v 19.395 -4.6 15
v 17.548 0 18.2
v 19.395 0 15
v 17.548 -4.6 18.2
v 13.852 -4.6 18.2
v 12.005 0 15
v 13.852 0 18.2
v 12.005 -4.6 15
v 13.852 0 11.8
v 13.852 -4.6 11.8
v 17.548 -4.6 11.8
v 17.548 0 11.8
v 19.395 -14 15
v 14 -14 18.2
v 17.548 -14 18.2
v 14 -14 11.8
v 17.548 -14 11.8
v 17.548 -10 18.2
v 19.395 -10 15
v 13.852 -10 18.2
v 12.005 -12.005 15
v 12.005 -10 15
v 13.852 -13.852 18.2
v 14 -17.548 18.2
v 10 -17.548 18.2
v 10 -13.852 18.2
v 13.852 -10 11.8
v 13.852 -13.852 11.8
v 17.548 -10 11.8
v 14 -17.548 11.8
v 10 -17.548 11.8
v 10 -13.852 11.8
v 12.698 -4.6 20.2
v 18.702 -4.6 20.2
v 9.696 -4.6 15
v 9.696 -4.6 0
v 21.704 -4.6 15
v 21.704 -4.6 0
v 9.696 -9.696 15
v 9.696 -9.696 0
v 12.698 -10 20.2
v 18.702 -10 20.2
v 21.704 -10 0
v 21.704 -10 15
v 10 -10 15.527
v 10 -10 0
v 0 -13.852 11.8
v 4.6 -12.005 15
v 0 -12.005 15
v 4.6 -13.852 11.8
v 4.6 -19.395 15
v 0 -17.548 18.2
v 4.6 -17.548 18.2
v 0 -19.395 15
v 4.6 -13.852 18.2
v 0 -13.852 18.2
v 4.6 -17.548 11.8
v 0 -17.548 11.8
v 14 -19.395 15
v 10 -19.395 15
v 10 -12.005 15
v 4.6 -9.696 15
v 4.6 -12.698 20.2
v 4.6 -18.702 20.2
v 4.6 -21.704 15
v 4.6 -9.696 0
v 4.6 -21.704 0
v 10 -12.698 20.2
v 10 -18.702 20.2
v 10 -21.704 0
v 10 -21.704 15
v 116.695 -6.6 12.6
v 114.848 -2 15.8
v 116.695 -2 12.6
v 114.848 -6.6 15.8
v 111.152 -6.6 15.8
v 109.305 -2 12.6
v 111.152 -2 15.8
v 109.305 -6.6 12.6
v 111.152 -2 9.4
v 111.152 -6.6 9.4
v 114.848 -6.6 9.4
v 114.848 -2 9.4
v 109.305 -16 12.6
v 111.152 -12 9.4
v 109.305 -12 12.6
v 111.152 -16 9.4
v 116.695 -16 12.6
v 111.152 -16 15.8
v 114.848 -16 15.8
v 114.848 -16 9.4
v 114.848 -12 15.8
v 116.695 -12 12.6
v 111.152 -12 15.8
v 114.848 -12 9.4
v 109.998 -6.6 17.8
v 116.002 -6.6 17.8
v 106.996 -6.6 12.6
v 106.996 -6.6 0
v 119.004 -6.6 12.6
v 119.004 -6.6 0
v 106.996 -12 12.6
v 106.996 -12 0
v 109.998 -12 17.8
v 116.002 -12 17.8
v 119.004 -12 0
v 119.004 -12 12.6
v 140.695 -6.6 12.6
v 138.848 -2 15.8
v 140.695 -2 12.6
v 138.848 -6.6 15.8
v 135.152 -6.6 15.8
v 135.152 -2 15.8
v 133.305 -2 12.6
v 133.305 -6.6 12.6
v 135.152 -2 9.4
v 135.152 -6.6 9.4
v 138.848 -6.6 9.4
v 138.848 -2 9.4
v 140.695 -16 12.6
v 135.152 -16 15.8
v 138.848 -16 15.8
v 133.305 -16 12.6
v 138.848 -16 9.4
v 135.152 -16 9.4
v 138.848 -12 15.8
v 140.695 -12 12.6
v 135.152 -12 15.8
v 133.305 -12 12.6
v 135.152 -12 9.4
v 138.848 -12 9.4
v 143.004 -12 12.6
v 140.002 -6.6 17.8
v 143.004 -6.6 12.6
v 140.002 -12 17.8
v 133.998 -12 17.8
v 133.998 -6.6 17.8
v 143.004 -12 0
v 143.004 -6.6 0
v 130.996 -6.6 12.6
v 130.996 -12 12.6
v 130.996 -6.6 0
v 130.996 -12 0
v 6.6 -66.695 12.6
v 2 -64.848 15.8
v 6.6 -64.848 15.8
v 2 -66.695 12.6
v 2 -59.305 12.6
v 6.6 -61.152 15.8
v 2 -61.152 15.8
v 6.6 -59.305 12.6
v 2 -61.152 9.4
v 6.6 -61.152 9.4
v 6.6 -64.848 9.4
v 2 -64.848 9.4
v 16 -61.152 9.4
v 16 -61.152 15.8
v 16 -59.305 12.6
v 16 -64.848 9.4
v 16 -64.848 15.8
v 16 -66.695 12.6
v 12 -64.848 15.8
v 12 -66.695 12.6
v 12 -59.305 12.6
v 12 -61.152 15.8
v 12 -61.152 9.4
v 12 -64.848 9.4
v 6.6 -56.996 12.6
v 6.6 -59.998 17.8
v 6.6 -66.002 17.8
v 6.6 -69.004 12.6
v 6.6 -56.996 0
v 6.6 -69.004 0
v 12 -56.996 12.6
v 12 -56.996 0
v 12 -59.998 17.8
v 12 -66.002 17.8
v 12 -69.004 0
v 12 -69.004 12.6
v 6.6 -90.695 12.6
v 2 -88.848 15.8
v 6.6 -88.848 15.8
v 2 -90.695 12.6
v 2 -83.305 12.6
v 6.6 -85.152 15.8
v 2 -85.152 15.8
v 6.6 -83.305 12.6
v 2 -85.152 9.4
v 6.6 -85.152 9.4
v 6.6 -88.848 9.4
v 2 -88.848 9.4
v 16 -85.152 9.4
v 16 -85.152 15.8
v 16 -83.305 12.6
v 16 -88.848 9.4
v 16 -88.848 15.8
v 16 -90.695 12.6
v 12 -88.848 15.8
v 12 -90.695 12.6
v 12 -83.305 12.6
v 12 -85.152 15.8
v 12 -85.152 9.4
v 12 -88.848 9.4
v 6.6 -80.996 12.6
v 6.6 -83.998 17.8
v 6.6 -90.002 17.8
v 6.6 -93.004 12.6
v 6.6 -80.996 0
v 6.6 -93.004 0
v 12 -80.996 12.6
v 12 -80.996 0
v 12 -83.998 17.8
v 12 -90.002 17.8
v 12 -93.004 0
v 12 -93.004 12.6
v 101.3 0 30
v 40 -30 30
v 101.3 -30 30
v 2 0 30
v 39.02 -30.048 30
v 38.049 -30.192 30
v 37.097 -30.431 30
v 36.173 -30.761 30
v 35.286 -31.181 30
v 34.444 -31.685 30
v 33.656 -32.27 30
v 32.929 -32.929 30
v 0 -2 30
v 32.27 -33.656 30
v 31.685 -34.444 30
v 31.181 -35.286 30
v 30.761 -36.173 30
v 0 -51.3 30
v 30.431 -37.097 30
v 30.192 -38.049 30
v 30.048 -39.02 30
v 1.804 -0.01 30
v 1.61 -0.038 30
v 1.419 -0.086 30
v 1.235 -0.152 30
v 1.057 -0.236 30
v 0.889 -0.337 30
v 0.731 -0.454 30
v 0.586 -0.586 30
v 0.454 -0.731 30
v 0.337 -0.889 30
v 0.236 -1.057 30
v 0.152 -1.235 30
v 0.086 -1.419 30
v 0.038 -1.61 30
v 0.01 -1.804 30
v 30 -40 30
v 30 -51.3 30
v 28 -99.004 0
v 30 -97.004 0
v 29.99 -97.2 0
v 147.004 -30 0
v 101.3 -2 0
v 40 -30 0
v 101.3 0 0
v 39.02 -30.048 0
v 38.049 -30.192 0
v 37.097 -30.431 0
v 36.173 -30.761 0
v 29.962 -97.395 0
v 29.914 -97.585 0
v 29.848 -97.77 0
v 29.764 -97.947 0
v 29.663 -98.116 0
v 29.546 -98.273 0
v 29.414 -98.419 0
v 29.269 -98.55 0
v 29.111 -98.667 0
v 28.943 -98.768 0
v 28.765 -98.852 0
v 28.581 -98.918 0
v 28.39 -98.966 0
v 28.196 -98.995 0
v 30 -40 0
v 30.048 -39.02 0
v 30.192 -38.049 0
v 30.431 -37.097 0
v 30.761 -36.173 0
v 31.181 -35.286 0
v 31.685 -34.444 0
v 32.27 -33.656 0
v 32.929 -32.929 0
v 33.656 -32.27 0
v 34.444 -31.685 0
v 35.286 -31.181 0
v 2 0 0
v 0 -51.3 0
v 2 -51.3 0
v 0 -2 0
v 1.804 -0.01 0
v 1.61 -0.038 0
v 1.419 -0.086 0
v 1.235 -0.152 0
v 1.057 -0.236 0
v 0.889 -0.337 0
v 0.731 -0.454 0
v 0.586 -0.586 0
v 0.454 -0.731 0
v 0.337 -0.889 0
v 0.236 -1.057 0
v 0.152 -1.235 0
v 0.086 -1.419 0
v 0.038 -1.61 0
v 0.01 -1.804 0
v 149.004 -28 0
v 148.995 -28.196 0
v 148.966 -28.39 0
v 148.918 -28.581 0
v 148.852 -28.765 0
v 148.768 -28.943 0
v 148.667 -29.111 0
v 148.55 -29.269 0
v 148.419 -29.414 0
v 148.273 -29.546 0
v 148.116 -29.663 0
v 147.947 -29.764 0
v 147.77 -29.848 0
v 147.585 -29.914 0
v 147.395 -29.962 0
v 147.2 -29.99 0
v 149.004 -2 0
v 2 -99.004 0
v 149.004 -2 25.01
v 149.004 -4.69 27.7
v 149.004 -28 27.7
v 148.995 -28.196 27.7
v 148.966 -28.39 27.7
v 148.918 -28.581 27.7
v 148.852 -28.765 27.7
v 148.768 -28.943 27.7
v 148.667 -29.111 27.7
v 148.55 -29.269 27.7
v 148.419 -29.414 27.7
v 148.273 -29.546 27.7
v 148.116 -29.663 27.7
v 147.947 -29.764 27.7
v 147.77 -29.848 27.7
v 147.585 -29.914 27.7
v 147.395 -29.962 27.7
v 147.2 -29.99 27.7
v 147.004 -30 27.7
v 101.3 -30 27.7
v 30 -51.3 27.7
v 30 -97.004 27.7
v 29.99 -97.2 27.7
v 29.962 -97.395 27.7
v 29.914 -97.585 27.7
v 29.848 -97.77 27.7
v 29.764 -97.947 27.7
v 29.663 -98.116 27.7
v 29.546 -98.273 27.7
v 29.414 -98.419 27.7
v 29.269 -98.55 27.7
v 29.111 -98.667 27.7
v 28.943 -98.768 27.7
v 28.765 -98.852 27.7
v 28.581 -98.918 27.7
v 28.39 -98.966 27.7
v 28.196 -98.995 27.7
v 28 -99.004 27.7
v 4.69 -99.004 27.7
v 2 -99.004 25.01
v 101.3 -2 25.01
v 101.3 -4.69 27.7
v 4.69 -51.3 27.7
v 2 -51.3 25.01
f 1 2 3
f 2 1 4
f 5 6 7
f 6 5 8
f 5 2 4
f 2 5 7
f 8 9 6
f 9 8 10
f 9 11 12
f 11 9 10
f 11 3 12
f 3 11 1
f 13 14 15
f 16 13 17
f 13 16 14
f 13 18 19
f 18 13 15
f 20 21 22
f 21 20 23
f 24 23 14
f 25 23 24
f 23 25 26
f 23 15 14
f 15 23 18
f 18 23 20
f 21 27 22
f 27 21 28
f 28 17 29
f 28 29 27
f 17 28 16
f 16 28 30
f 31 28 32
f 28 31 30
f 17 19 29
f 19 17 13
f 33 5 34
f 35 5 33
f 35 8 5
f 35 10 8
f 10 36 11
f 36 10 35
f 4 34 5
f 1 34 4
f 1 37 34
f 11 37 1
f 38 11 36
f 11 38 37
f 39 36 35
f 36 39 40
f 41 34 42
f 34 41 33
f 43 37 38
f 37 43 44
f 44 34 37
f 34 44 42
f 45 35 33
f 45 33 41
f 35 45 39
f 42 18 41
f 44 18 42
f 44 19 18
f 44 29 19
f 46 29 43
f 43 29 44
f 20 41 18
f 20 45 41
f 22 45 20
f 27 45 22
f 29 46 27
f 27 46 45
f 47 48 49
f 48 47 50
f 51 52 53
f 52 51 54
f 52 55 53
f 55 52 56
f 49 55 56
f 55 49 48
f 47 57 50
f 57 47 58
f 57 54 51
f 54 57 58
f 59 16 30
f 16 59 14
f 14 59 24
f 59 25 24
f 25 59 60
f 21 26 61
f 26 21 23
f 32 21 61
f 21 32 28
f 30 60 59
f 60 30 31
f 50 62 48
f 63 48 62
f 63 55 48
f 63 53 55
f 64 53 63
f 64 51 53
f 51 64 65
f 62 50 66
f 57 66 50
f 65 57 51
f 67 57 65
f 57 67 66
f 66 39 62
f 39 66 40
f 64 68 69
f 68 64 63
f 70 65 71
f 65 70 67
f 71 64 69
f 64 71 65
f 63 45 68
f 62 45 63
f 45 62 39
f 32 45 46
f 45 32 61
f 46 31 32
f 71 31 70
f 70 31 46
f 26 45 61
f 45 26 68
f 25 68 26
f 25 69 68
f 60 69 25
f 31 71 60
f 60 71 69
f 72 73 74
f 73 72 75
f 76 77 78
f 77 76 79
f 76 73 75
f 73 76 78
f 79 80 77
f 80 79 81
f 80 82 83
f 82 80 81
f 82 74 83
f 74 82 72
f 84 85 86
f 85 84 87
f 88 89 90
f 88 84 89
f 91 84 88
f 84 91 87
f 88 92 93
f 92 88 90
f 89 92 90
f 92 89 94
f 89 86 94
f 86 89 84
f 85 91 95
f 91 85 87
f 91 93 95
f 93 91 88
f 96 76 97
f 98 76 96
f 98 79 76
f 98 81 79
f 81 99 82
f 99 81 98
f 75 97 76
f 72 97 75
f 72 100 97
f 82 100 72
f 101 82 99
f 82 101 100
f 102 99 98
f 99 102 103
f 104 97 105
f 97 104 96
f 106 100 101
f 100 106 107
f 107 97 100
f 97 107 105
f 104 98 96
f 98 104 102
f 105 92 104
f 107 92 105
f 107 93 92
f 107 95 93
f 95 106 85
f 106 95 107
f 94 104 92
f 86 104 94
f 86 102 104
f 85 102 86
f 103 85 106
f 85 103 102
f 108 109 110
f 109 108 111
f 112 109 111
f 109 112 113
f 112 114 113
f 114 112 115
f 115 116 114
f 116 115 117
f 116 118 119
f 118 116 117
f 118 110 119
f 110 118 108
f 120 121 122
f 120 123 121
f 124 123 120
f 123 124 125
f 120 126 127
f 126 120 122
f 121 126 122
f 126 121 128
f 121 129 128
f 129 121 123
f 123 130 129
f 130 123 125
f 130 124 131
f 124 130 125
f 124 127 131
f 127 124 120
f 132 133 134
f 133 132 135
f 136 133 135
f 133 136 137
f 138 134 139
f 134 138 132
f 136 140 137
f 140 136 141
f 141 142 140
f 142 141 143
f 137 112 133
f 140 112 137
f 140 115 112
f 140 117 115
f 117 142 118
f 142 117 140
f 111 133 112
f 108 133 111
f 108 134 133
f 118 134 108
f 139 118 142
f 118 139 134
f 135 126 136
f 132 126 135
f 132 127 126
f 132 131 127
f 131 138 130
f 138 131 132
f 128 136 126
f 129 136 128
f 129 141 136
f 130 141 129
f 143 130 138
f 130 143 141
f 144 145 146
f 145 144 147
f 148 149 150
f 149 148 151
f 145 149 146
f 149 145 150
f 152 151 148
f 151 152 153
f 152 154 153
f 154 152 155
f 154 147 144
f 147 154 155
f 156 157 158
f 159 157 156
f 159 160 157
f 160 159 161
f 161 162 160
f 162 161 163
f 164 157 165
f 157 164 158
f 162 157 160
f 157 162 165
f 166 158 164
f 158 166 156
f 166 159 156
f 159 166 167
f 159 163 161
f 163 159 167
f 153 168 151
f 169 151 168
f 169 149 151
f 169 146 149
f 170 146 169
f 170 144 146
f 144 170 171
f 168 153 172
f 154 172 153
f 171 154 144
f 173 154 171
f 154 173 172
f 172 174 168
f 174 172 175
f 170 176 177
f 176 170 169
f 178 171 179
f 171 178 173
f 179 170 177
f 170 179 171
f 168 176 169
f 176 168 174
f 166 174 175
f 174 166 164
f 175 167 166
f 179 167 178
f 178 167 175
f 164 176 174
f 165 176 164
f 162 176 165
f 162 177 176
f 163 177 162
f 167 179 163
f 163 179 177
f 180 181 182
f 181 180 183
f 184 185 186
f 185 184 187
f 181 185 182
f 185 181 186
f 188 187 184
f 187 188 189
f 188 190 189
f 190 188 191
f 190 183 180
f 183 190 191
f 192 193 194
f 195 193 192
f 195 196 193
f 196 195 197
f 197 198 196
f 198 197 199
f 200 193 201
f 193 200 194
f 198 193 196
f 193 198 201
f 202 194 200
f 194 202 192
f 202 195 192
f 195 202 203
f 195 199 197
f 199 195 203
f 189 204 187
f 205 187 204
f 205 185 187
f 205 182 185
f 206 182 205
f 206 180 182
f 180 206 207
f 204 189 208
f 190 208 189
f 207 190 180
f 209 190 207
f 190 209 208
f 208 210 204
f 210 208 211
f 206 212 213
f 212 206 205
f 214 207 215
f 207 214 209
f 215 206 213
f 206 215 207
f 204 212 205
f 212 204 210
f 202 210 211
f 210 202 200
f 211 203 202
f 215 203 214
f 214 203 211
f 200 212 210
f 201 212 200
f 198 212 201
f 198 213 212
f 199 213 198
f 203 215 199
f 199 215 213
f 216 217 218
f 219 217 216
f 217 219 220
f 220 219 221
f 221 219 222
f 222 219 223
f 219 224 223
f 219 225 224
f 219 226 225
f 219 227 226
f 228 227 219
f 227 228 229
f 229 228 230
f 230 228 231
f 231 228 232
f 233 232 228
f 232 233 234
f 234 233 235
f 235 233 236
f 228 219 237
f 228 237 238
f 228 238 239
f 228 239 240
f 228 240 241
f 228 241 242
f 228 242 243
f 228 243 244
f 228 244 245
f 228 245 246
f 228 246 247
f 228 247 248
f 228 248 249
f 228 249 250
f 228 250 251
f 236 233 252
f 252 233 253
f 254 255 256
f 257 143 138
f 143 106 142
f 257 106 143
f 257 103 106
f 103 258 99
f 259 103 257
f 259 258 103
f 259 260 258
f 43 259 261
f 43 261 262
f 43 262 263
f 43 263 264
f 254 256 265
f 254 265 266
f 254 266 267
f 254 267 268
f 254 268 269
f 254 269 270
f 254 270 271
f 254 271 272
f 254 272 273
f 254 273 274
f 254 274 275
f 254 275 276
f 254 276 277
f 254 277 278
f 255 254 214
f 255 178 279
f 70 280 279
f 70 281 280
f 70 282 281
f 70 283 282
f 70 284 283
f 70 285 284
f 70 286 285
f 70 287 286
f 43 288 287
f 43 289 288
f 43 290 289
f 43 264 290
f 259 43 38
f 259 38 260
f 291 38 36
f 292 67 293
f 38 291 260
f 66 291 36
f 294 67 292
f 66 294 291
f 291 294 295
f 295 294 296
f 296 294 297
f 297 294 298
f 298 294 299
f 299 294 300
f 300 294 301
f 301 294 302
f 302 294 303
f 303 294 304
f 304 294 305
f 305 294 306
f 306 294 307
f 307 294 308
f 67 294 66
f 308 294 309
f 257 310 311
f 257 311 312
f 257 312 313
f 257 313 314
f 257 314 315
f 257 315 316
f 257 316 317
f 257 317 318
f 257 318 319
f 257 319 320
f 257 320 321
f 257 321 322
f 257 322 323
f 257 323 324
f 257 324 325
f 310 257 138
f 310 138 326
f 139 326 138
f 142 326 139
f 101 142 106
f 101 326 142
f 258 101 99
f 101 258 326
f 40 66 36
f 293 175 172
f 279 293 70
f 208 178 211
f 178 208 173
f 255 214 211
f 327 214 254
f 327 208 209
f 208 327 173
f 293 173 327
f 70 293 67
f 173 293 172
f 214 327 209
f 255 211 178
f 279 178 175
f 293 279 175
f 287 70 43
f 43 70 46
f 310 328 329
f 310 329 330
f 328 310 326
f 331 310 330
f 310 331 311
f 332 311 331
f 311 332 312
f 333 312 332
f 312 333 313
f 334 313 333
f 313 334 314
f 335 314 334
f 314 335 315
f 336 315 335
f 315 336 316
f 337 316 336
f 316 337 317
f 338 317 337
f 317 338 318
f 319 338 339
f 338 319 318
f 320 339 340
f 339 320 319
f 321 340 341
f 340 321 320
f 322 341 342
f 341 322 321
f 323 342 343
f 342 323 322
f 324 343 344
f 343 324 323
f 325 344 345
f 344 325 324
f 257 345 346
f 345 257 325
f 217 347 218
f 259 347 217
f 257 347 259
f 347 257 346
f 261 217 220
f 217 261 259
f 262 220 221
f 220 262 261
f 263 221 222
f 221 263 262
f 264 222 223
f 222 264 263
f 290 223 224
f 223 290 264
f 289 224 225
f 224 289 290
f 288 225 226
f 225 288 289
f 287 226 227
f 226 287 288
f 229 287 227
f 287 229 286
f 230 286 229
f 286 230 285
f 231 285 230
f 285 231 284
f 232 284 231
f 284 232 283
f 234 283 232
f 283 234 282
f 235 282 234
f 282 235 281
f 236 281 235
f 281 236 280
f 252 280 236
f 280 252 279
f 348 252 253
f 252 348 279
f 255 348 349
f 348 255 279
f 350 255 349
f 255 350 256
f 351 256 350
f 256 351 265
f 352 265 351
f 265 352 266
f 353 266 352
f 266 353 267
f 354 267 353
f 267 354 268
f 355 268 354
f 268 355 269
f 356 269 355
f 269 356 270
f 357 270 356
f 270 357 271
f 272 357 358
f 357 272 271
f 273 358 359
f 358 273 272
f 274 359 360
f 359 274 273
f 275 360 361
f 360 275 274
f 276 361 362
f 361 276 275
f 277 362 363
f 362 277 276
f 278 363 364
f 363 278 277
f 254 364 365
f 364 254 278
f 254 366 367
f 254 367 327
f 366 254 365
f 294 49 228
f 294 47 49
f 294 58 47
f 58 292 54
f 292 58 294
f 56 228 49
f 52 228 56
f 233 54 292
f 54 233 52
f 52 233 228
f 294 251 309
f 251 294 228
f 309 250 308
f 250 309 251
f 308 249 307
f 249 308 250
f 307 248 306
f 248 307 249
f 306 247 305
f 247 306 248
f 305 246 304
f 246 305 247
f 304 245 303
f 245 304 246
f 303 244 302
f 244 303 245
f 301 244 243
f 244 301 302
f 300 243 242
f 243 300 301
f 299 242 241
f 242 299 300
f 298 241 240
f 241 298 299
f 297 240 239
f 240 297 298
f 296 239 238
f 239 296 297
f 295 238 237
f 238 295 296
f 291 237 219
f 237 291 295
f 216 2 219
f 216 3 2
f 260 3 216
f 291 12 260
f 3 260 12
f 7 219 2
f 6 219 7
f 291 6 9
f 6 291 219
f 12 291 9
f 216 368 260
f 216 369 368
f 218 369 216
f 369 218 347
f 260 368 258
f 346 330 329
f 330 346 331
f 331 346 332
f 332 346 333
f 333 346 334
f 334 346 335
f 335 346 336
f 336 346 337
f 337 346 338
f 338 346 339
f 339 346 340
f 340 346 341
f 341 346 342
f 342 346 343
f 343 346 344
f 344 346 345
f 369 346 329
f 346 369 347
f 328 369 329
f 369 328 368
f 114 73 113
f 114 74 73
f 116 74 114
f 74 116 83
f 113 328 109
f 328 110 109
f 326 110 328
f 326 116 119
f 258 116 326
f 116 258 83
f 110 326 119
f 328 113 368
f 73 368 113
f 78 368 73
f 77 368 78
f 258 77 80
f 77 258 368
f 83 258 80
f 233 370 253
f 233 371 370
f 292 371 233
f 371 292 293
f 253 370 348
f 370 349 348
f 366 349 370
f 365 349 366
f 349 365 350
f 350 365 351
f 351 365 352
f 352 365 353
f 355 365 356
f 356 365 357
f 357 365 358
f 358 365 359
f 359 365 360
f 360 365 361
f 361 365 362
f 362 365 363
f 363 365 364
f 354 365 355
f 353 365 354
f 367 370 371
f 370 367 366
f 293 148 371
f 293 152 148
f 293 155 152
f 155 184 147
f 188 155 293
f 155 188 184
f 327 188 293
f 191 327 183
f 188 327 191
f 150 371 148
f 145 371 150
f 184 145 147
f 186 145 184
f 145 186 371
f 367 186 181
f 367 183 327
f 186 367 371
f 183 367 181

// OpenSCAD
// file: ../../../../modules/steel_rack.scad
use <bolts.scad>;

bolt_edge_offset = 15;
bolt_positions = [
  bolt_edge_offset,
  bolt_edge_offset + 98,
  bolt_edge_offset + 98 + 24,
];

module bolt_and_nut(y, h) {
  nut_thickness = 5;
  translate([0, y, h / 2])
    m6_bolt_hole(h + 1, center = true);
  translate([0, y, h - nut_thickness / 2])
    rotate([0, 0, 90])
    m6_nut_trap(nut_thickness, center = true);
}

module long_bar(w, y, h) {
  difference() {
    translate([w / 2, y / 2, h / 2])
      cube([w, y, h], center = true);

    for (x = bolt_positions) {
      translate([x, 0, 0])
        bolt_and_nut(y / 2, h);
    }
  }
}

module short_bar(w, y, h) {
  difference() {
    translate([w / 2, y / 2, h / 2])
      cube([w, y, h], center = true);

    translate([bolt_positions[0], 0, 0])
      bolt_and_nut(y / 2, h);
  }
}

module fillet_profile(r, h) {
  linear_extrude(height = h, center = true)
    difference() {
      square([r, r]);
      circle(r = r, $fn = 64);
    }
}
// file: ../../../../modules/slide_rail_outer_bracket.scad
use <bolts.scad>
use <steel_rack.scad>

// スライドレール外側とL字アングルを接合するL字ブラケット。
// 設計の経緯と確定値は ledger/designs/steel-rack-500x400.md が正本。
//
// 座標系 (部品自身の datum):
//   X = 0 がこの部品側のL字アングル外側面。部品はアングル板厚の内側から始まる
//   Y = 0 がスライドレール外側面。+Y がラック外側
//   Z = 0 が部品底面 (レール下端と一致)
// front は screw_x = [37, 101.5]、rear は [79.5, 176] を自分の datum
// から渡す。 M6 が高さ 22.5±12 の対称配置のため部品は Z 反転対称になり、
// 左右のレールにも上下反転するだけで同じ2部品を使い回せる。

bracket_height = 45;
flange_t = 10; // 短辺 (X方向厚) の厚さ
// 長辺 (Y方向厚) の厚さ。旧断面は flange_t=10 を共用していたが、レール面を
// rail_offset 分外へ出すと M6 ナット挿入口が長辺と重なるため 2mm 削った
// (10→8、user決定)。ナット六角の内縁 (y=8.000) と長辺外面がツライチになる
arm_t = 8;
// レール接触面のラック外側オフセット。組付け実測でレール間隔が 385mm しか
// なくケース 412mm が入らないため、(412 - 385) / 2 + 0.5 = 14mm ずつ
// 各レールを外側へ移す (user指示)。M6 実穴は既に開いており位置を変えられない
rail_offset = 14;
inner_r = 4;
m6_z = [ 10.5, 34.5 ];
// クリアランス基準: 呼び寸法 + 0.4mm (実プリントの嵌合結果から拡大)
m6_pass_flat = 6.4; // M6ボルト通し六角の二面幅 (手前5mm)
m6_nut_flat = 10.4; // M6ナット窪み六角の二面幅 (奥5mm、ナット実測9.8 + 実効0.6)
m6_stage_depth = 5;
screw_z = 22.5;
m4_pass_flat = 4.4; // M4小トラスネジ通し六角の二面幅
m4_nut_flat = 7.4; // M4ナット窪み六角の二面幅 (ナット実測6.8 + 実効0.6)
m4_nut_depth = 2.8; // M4ナット窪みの深さ (user指定)
edge_margin = 8; // 穴の外縁から部品端までの余白 (自由な辺のみ)
angle_t = 2.2; // L字アングルの板厚

// 六角プリズム: 軸X・上下の辺が水平 (flat-up)。
// 天井を短い水平ブリッジにして垂れの改善を狙う
// (point-up だと天井面が水平から30°になり垂れた — 嵌合試験で確認済み)
module
hex_x_flat_up(flat_d, l)
{
    rotate([ 0, 90, 0 ]) rotate([ 0, 0, 90 ]) hex_hole(flat_d = flat_d, h = l);
}

// 六角プリズム: 軸Y・上下の辺が水平 (flat-up)。M6と同じくブリッジ天井
module
hex_y_flat_up(flat_d, l)
{
    rotate([ 90, 0, 0 ]) hex_hole(flat_d = flat_d, h = l);
}

module
slide_rail_outer_bracket(screw_x, name = "bracket")
{
    // flat-up配置では水平方向の穴半径は対角/2 (= 二面幅/(2*cos30))。
    // 8mm余白の契約はこの実半径に対して守る
    m6_nut_diag = m6_nut_flat / cos(30);
    m4_nut_diag = m4_nut_flat / cos(30);
    // M6中心: 実物のアングルには旧断面 (長辺厚10) の導出値
    // (厚10 + 内側R + 余白 + M6六角対角/2 = 28.0044) で既に穴が開いている。
    // 旧導出式から rail_offset を引くことで M6 実穴と部品外端の絶対位置を
    // 保ったまま、レール接触面 (y=0) だけをラック外側へ 14mm 出す
    m6_y = flange_t + inner_r + edge_margin + m6_nut_diag / 2 - rail_offset;
    short_len = m6_y + m6_nut_diag / 2 + edge_margin;
    // 長辺のX終端: 最奥のM4穴の最大断面 (ナット窪みの対角の半分) + 余白
    arm_end = max(screw_x) + m4_nut_diag / 2 + edge_margin;

    echo(str("CONTRACT ", name, ": height = ", bracket_height));
    echo(str("CONTRACT ", name, ": flange_t = ", flange_t));
    echo(str("CONTRACT ", name, ": arm_t = ", arm_t));
    echo(str("CONTRACT ", name, ": rail_offset = ", rail_offset));
    echo(str("CONTRACT ", name, ": inner_r = ", inner_r));
    echo(str("CONTRACT ", name, ": m6_z = ", m6_z));
    echo(str("CONTRACT ", name, ": m6_pass_flat = ", m6_pass_flat));
    echo(str("CONTRACT ", name, ": m6_nut_flat = ", m6_nut_flat));
    echo(str("CONTRACT ", name, ": screw_z = ", screw_z));
    echo(str("CONTRACT ", name, ": m4_pass_flat = ", m4_pass_flat));
    echo(str("CONTRACT ", name, ": m4_nut_flat = ", m4_nut_flat));
    echo(str("CONTRACT ", name, ": m4_nut_depth = ", m4_nut_depth));
    echo(str("CONTRACT ", name, ": edge_margin = ", edge_margin));
    echo(str("CONTRACT ", name, ": angle_t = ", angle_t));
    echo(str("CONTRACT ", name, ": screw_x = ", screw_x));
    echo(str("CONTRACT ",
             name,
             ": m6_y = ",
             m6_y,
             ", short_len = ",
             short_len,
             ", arm_end = ",
             arm_end));

    // 余白の契約 (自由な辺のみ。高さ45とM6のZはuser固定値なので対象外)。
    // M6ナット六角の内縁 (m6_y - 対角/2 = 8.000) は長辺外面 (y = arm_t) と
    // ツライチで、ナット挿入口が長辺に塞がれない (1e-9 は浮動小数の丸め猶予)
    assert(m6_y - m6_nut_diag / 2 >= arm_t - 1e-9,
           "M6 nut slot is blocked by the arm");
    assert(short_len - (m6_y + m6_nut_diag / 2) >= edge_margin,
           "M6 hole too close to the short-flange edge");
    assert(arm_end - (max(screw_x) + m4_nut_diag / 2) >= edge_margin,
           "M4 hole too close to the arm end");
    assert(min(screw_x) - m4_nut_diag / 2 >= angle_t + flange_t,
           "M4 hole overlaps the short flange");

    difference()
    {
        union()
        {
            // 短辺: アングル内側に当たる縦板 (M6で締結)
            translate([ angle_t, 0, 0 ])
                cube([ flange_t, short_len, bracket_height ]);

            // 長辺: レール外側面に当たる横板 (M4小トラスネジ+ナットで締結)
            translate([ angle_t, 0, 0 ])
                cube([ arm_end - angle_t, arm_t, bracket_height ]);

            // 内側コーナーのR4フィレット (応力集中の回避)
            translate([
                angle_t + flange_t + inner_r,
                arm_t + inner_r,
                bracket_height / 2
            ]) rotate([ 0, 0, 180 ]) fillet_profile(inner_r, bracket_height);
        }

        // M6の2段六角穴 (軸X・flat-up): 手前5mmが通し、奥5mmがナット窪み。
        // ナット窪みは +X へ延長した挿入回廊 (x=7.2..17): 短辺の背面から
        // fillet の掛かる区間を局所カットし、fillet 外端 (x=16.2) を 0.8mm
        // 超えて開放することで M6 ナットを +X 側から真っ直ぐ挿入できる
        // (fillet と挿入経路の干渉分を削るのは user 許容)。
        // 六角の下頂点 (y=8.000) は長辺外面とツライチで、正確な接触は
        // 退化した稜 (非多様体STL) を作るため、hull で 0.2mm 下へ掃引して
        // 長辺外面に浅い逃げ溝を彫る (ナットの嵌合には影響しない)
        slot_start = angle_t + flange_t - m6_stage_depth;
        slot_end = angle_t + flange_t + inner_r + 0.8;
        slot_relief = 0.2;
        for (z = m6_z) {
            translate([ angle_t + m6_stage_depth / 2 - 0.05, m6_y, z ])
                hex_x_flat_up(m6_pass_flat, m6_stage_depth + 0.1);
            translate([ (slot_start + slot_end) / 2, m6_y, z ]) hull()
            {
                hex_x_flat_up(m6_nut_flat, slot_end - slot_start);
                translate([ 0, -slot_relief, 0 ])
                    hex_x_flat_up(m6_nut_flat, slot_end - slot_start);
            }
        }

        // M4小トラスネジの穴 (軸Y・flat-up):
        // 通しは全厚を貫通し、L字の内側面 (y=8) から深さ2.8mmのナット窪み。
        // ネジはレール内側から刺さり
        // (トラス頭はスライダーと干渉しない実測済み)、
        // ナットが窪みの底で受けてレール板とブラケットを共締めする
        for (x = screw_x) {
            translate([ x, arm_t / 2, screw_z ])
                hex_y_flat_up(m4_pass_flat, arm_t + 0.2);
            translate([ x, arm_t - m4_nut_depth / 2 + 0.05, screw_z ])
                hex_y_flat_up(m4_nut_flat, m4_nut_depth + 0.1);
        }
    }
}
// file: ../../../../modules/bolts.scad
module nut_trap(d, h, center = true) {
  linear_extrude(height = h, center = center)
  circle(d = d / cos(30), $fn = 6);
}

module bolt_hole(d, h, center = true) {
  linear_extrude(height = h, center = center)
  circle(d = d, $fn = 64);
}

// Hex holes for self-tapping (nominal - 0.2mm)
module hex_hole(flat_d, h) {
  linear_extrude(height = h, center = true)
  circle(d = flat_d / cos(30), $fn = 6);
}

module m3_bolt_hexhole(h) {
  rotate([0, 0, 90]) hex_hole(flat_d = 2.8, h = h);
}

module m4_bolt_hexhole(h) {
  rotate([0, 0, 90]) hex_hole(flat_d = 3.8, h = h);
}

module m6_bolt_hexhole(h) {
  rotate([0, 0, 90]) hex_hole(flat_d = 5.8, h = h);
}

module m8_bolt_hexhole(h) {
  rotate([0, 0, 90]) hex_hole(flat_d = 7.8, h = h);
}

// M3
module m3_bolt_hole(h, center = false) { bolt_hole(d = 3.4, h = h, center = center); }
module m3_nut_trap(h, center = false) { nut_trap(d = 5.7, h = h, center = center); }

// M4
module m4_bolt_hole(h, center = false) { bolt_hole(d = 4.4, h = h, center = center); }
module m4_nut_trap(h, center = false) { nut_trap(d = 7.5, h = h, center = center); }

// M6
module m6_bolt_hole(h, center = false) { bolt_hole(d = 6.2, h = h, center = center); }
module m6_nut_trap(h, center = false) { nut_trap(d = 10.2, h = h, center = center); }

// M8
module m8_bolt_hole(h, center = false) { bolt_hole(d = 8.4, h = h, center = center); }
module m8_nut_trap(h, center = false) { nut_trap(d = 13.3, h = h, center = center); }
// main file
use <../../../../modules/shelf_frame.scad>

// ケース棚の枠の角。手前左・奥右用。印刷は上面をビルドプレートへ置いた向き。
shelf_frame_corner_print();
